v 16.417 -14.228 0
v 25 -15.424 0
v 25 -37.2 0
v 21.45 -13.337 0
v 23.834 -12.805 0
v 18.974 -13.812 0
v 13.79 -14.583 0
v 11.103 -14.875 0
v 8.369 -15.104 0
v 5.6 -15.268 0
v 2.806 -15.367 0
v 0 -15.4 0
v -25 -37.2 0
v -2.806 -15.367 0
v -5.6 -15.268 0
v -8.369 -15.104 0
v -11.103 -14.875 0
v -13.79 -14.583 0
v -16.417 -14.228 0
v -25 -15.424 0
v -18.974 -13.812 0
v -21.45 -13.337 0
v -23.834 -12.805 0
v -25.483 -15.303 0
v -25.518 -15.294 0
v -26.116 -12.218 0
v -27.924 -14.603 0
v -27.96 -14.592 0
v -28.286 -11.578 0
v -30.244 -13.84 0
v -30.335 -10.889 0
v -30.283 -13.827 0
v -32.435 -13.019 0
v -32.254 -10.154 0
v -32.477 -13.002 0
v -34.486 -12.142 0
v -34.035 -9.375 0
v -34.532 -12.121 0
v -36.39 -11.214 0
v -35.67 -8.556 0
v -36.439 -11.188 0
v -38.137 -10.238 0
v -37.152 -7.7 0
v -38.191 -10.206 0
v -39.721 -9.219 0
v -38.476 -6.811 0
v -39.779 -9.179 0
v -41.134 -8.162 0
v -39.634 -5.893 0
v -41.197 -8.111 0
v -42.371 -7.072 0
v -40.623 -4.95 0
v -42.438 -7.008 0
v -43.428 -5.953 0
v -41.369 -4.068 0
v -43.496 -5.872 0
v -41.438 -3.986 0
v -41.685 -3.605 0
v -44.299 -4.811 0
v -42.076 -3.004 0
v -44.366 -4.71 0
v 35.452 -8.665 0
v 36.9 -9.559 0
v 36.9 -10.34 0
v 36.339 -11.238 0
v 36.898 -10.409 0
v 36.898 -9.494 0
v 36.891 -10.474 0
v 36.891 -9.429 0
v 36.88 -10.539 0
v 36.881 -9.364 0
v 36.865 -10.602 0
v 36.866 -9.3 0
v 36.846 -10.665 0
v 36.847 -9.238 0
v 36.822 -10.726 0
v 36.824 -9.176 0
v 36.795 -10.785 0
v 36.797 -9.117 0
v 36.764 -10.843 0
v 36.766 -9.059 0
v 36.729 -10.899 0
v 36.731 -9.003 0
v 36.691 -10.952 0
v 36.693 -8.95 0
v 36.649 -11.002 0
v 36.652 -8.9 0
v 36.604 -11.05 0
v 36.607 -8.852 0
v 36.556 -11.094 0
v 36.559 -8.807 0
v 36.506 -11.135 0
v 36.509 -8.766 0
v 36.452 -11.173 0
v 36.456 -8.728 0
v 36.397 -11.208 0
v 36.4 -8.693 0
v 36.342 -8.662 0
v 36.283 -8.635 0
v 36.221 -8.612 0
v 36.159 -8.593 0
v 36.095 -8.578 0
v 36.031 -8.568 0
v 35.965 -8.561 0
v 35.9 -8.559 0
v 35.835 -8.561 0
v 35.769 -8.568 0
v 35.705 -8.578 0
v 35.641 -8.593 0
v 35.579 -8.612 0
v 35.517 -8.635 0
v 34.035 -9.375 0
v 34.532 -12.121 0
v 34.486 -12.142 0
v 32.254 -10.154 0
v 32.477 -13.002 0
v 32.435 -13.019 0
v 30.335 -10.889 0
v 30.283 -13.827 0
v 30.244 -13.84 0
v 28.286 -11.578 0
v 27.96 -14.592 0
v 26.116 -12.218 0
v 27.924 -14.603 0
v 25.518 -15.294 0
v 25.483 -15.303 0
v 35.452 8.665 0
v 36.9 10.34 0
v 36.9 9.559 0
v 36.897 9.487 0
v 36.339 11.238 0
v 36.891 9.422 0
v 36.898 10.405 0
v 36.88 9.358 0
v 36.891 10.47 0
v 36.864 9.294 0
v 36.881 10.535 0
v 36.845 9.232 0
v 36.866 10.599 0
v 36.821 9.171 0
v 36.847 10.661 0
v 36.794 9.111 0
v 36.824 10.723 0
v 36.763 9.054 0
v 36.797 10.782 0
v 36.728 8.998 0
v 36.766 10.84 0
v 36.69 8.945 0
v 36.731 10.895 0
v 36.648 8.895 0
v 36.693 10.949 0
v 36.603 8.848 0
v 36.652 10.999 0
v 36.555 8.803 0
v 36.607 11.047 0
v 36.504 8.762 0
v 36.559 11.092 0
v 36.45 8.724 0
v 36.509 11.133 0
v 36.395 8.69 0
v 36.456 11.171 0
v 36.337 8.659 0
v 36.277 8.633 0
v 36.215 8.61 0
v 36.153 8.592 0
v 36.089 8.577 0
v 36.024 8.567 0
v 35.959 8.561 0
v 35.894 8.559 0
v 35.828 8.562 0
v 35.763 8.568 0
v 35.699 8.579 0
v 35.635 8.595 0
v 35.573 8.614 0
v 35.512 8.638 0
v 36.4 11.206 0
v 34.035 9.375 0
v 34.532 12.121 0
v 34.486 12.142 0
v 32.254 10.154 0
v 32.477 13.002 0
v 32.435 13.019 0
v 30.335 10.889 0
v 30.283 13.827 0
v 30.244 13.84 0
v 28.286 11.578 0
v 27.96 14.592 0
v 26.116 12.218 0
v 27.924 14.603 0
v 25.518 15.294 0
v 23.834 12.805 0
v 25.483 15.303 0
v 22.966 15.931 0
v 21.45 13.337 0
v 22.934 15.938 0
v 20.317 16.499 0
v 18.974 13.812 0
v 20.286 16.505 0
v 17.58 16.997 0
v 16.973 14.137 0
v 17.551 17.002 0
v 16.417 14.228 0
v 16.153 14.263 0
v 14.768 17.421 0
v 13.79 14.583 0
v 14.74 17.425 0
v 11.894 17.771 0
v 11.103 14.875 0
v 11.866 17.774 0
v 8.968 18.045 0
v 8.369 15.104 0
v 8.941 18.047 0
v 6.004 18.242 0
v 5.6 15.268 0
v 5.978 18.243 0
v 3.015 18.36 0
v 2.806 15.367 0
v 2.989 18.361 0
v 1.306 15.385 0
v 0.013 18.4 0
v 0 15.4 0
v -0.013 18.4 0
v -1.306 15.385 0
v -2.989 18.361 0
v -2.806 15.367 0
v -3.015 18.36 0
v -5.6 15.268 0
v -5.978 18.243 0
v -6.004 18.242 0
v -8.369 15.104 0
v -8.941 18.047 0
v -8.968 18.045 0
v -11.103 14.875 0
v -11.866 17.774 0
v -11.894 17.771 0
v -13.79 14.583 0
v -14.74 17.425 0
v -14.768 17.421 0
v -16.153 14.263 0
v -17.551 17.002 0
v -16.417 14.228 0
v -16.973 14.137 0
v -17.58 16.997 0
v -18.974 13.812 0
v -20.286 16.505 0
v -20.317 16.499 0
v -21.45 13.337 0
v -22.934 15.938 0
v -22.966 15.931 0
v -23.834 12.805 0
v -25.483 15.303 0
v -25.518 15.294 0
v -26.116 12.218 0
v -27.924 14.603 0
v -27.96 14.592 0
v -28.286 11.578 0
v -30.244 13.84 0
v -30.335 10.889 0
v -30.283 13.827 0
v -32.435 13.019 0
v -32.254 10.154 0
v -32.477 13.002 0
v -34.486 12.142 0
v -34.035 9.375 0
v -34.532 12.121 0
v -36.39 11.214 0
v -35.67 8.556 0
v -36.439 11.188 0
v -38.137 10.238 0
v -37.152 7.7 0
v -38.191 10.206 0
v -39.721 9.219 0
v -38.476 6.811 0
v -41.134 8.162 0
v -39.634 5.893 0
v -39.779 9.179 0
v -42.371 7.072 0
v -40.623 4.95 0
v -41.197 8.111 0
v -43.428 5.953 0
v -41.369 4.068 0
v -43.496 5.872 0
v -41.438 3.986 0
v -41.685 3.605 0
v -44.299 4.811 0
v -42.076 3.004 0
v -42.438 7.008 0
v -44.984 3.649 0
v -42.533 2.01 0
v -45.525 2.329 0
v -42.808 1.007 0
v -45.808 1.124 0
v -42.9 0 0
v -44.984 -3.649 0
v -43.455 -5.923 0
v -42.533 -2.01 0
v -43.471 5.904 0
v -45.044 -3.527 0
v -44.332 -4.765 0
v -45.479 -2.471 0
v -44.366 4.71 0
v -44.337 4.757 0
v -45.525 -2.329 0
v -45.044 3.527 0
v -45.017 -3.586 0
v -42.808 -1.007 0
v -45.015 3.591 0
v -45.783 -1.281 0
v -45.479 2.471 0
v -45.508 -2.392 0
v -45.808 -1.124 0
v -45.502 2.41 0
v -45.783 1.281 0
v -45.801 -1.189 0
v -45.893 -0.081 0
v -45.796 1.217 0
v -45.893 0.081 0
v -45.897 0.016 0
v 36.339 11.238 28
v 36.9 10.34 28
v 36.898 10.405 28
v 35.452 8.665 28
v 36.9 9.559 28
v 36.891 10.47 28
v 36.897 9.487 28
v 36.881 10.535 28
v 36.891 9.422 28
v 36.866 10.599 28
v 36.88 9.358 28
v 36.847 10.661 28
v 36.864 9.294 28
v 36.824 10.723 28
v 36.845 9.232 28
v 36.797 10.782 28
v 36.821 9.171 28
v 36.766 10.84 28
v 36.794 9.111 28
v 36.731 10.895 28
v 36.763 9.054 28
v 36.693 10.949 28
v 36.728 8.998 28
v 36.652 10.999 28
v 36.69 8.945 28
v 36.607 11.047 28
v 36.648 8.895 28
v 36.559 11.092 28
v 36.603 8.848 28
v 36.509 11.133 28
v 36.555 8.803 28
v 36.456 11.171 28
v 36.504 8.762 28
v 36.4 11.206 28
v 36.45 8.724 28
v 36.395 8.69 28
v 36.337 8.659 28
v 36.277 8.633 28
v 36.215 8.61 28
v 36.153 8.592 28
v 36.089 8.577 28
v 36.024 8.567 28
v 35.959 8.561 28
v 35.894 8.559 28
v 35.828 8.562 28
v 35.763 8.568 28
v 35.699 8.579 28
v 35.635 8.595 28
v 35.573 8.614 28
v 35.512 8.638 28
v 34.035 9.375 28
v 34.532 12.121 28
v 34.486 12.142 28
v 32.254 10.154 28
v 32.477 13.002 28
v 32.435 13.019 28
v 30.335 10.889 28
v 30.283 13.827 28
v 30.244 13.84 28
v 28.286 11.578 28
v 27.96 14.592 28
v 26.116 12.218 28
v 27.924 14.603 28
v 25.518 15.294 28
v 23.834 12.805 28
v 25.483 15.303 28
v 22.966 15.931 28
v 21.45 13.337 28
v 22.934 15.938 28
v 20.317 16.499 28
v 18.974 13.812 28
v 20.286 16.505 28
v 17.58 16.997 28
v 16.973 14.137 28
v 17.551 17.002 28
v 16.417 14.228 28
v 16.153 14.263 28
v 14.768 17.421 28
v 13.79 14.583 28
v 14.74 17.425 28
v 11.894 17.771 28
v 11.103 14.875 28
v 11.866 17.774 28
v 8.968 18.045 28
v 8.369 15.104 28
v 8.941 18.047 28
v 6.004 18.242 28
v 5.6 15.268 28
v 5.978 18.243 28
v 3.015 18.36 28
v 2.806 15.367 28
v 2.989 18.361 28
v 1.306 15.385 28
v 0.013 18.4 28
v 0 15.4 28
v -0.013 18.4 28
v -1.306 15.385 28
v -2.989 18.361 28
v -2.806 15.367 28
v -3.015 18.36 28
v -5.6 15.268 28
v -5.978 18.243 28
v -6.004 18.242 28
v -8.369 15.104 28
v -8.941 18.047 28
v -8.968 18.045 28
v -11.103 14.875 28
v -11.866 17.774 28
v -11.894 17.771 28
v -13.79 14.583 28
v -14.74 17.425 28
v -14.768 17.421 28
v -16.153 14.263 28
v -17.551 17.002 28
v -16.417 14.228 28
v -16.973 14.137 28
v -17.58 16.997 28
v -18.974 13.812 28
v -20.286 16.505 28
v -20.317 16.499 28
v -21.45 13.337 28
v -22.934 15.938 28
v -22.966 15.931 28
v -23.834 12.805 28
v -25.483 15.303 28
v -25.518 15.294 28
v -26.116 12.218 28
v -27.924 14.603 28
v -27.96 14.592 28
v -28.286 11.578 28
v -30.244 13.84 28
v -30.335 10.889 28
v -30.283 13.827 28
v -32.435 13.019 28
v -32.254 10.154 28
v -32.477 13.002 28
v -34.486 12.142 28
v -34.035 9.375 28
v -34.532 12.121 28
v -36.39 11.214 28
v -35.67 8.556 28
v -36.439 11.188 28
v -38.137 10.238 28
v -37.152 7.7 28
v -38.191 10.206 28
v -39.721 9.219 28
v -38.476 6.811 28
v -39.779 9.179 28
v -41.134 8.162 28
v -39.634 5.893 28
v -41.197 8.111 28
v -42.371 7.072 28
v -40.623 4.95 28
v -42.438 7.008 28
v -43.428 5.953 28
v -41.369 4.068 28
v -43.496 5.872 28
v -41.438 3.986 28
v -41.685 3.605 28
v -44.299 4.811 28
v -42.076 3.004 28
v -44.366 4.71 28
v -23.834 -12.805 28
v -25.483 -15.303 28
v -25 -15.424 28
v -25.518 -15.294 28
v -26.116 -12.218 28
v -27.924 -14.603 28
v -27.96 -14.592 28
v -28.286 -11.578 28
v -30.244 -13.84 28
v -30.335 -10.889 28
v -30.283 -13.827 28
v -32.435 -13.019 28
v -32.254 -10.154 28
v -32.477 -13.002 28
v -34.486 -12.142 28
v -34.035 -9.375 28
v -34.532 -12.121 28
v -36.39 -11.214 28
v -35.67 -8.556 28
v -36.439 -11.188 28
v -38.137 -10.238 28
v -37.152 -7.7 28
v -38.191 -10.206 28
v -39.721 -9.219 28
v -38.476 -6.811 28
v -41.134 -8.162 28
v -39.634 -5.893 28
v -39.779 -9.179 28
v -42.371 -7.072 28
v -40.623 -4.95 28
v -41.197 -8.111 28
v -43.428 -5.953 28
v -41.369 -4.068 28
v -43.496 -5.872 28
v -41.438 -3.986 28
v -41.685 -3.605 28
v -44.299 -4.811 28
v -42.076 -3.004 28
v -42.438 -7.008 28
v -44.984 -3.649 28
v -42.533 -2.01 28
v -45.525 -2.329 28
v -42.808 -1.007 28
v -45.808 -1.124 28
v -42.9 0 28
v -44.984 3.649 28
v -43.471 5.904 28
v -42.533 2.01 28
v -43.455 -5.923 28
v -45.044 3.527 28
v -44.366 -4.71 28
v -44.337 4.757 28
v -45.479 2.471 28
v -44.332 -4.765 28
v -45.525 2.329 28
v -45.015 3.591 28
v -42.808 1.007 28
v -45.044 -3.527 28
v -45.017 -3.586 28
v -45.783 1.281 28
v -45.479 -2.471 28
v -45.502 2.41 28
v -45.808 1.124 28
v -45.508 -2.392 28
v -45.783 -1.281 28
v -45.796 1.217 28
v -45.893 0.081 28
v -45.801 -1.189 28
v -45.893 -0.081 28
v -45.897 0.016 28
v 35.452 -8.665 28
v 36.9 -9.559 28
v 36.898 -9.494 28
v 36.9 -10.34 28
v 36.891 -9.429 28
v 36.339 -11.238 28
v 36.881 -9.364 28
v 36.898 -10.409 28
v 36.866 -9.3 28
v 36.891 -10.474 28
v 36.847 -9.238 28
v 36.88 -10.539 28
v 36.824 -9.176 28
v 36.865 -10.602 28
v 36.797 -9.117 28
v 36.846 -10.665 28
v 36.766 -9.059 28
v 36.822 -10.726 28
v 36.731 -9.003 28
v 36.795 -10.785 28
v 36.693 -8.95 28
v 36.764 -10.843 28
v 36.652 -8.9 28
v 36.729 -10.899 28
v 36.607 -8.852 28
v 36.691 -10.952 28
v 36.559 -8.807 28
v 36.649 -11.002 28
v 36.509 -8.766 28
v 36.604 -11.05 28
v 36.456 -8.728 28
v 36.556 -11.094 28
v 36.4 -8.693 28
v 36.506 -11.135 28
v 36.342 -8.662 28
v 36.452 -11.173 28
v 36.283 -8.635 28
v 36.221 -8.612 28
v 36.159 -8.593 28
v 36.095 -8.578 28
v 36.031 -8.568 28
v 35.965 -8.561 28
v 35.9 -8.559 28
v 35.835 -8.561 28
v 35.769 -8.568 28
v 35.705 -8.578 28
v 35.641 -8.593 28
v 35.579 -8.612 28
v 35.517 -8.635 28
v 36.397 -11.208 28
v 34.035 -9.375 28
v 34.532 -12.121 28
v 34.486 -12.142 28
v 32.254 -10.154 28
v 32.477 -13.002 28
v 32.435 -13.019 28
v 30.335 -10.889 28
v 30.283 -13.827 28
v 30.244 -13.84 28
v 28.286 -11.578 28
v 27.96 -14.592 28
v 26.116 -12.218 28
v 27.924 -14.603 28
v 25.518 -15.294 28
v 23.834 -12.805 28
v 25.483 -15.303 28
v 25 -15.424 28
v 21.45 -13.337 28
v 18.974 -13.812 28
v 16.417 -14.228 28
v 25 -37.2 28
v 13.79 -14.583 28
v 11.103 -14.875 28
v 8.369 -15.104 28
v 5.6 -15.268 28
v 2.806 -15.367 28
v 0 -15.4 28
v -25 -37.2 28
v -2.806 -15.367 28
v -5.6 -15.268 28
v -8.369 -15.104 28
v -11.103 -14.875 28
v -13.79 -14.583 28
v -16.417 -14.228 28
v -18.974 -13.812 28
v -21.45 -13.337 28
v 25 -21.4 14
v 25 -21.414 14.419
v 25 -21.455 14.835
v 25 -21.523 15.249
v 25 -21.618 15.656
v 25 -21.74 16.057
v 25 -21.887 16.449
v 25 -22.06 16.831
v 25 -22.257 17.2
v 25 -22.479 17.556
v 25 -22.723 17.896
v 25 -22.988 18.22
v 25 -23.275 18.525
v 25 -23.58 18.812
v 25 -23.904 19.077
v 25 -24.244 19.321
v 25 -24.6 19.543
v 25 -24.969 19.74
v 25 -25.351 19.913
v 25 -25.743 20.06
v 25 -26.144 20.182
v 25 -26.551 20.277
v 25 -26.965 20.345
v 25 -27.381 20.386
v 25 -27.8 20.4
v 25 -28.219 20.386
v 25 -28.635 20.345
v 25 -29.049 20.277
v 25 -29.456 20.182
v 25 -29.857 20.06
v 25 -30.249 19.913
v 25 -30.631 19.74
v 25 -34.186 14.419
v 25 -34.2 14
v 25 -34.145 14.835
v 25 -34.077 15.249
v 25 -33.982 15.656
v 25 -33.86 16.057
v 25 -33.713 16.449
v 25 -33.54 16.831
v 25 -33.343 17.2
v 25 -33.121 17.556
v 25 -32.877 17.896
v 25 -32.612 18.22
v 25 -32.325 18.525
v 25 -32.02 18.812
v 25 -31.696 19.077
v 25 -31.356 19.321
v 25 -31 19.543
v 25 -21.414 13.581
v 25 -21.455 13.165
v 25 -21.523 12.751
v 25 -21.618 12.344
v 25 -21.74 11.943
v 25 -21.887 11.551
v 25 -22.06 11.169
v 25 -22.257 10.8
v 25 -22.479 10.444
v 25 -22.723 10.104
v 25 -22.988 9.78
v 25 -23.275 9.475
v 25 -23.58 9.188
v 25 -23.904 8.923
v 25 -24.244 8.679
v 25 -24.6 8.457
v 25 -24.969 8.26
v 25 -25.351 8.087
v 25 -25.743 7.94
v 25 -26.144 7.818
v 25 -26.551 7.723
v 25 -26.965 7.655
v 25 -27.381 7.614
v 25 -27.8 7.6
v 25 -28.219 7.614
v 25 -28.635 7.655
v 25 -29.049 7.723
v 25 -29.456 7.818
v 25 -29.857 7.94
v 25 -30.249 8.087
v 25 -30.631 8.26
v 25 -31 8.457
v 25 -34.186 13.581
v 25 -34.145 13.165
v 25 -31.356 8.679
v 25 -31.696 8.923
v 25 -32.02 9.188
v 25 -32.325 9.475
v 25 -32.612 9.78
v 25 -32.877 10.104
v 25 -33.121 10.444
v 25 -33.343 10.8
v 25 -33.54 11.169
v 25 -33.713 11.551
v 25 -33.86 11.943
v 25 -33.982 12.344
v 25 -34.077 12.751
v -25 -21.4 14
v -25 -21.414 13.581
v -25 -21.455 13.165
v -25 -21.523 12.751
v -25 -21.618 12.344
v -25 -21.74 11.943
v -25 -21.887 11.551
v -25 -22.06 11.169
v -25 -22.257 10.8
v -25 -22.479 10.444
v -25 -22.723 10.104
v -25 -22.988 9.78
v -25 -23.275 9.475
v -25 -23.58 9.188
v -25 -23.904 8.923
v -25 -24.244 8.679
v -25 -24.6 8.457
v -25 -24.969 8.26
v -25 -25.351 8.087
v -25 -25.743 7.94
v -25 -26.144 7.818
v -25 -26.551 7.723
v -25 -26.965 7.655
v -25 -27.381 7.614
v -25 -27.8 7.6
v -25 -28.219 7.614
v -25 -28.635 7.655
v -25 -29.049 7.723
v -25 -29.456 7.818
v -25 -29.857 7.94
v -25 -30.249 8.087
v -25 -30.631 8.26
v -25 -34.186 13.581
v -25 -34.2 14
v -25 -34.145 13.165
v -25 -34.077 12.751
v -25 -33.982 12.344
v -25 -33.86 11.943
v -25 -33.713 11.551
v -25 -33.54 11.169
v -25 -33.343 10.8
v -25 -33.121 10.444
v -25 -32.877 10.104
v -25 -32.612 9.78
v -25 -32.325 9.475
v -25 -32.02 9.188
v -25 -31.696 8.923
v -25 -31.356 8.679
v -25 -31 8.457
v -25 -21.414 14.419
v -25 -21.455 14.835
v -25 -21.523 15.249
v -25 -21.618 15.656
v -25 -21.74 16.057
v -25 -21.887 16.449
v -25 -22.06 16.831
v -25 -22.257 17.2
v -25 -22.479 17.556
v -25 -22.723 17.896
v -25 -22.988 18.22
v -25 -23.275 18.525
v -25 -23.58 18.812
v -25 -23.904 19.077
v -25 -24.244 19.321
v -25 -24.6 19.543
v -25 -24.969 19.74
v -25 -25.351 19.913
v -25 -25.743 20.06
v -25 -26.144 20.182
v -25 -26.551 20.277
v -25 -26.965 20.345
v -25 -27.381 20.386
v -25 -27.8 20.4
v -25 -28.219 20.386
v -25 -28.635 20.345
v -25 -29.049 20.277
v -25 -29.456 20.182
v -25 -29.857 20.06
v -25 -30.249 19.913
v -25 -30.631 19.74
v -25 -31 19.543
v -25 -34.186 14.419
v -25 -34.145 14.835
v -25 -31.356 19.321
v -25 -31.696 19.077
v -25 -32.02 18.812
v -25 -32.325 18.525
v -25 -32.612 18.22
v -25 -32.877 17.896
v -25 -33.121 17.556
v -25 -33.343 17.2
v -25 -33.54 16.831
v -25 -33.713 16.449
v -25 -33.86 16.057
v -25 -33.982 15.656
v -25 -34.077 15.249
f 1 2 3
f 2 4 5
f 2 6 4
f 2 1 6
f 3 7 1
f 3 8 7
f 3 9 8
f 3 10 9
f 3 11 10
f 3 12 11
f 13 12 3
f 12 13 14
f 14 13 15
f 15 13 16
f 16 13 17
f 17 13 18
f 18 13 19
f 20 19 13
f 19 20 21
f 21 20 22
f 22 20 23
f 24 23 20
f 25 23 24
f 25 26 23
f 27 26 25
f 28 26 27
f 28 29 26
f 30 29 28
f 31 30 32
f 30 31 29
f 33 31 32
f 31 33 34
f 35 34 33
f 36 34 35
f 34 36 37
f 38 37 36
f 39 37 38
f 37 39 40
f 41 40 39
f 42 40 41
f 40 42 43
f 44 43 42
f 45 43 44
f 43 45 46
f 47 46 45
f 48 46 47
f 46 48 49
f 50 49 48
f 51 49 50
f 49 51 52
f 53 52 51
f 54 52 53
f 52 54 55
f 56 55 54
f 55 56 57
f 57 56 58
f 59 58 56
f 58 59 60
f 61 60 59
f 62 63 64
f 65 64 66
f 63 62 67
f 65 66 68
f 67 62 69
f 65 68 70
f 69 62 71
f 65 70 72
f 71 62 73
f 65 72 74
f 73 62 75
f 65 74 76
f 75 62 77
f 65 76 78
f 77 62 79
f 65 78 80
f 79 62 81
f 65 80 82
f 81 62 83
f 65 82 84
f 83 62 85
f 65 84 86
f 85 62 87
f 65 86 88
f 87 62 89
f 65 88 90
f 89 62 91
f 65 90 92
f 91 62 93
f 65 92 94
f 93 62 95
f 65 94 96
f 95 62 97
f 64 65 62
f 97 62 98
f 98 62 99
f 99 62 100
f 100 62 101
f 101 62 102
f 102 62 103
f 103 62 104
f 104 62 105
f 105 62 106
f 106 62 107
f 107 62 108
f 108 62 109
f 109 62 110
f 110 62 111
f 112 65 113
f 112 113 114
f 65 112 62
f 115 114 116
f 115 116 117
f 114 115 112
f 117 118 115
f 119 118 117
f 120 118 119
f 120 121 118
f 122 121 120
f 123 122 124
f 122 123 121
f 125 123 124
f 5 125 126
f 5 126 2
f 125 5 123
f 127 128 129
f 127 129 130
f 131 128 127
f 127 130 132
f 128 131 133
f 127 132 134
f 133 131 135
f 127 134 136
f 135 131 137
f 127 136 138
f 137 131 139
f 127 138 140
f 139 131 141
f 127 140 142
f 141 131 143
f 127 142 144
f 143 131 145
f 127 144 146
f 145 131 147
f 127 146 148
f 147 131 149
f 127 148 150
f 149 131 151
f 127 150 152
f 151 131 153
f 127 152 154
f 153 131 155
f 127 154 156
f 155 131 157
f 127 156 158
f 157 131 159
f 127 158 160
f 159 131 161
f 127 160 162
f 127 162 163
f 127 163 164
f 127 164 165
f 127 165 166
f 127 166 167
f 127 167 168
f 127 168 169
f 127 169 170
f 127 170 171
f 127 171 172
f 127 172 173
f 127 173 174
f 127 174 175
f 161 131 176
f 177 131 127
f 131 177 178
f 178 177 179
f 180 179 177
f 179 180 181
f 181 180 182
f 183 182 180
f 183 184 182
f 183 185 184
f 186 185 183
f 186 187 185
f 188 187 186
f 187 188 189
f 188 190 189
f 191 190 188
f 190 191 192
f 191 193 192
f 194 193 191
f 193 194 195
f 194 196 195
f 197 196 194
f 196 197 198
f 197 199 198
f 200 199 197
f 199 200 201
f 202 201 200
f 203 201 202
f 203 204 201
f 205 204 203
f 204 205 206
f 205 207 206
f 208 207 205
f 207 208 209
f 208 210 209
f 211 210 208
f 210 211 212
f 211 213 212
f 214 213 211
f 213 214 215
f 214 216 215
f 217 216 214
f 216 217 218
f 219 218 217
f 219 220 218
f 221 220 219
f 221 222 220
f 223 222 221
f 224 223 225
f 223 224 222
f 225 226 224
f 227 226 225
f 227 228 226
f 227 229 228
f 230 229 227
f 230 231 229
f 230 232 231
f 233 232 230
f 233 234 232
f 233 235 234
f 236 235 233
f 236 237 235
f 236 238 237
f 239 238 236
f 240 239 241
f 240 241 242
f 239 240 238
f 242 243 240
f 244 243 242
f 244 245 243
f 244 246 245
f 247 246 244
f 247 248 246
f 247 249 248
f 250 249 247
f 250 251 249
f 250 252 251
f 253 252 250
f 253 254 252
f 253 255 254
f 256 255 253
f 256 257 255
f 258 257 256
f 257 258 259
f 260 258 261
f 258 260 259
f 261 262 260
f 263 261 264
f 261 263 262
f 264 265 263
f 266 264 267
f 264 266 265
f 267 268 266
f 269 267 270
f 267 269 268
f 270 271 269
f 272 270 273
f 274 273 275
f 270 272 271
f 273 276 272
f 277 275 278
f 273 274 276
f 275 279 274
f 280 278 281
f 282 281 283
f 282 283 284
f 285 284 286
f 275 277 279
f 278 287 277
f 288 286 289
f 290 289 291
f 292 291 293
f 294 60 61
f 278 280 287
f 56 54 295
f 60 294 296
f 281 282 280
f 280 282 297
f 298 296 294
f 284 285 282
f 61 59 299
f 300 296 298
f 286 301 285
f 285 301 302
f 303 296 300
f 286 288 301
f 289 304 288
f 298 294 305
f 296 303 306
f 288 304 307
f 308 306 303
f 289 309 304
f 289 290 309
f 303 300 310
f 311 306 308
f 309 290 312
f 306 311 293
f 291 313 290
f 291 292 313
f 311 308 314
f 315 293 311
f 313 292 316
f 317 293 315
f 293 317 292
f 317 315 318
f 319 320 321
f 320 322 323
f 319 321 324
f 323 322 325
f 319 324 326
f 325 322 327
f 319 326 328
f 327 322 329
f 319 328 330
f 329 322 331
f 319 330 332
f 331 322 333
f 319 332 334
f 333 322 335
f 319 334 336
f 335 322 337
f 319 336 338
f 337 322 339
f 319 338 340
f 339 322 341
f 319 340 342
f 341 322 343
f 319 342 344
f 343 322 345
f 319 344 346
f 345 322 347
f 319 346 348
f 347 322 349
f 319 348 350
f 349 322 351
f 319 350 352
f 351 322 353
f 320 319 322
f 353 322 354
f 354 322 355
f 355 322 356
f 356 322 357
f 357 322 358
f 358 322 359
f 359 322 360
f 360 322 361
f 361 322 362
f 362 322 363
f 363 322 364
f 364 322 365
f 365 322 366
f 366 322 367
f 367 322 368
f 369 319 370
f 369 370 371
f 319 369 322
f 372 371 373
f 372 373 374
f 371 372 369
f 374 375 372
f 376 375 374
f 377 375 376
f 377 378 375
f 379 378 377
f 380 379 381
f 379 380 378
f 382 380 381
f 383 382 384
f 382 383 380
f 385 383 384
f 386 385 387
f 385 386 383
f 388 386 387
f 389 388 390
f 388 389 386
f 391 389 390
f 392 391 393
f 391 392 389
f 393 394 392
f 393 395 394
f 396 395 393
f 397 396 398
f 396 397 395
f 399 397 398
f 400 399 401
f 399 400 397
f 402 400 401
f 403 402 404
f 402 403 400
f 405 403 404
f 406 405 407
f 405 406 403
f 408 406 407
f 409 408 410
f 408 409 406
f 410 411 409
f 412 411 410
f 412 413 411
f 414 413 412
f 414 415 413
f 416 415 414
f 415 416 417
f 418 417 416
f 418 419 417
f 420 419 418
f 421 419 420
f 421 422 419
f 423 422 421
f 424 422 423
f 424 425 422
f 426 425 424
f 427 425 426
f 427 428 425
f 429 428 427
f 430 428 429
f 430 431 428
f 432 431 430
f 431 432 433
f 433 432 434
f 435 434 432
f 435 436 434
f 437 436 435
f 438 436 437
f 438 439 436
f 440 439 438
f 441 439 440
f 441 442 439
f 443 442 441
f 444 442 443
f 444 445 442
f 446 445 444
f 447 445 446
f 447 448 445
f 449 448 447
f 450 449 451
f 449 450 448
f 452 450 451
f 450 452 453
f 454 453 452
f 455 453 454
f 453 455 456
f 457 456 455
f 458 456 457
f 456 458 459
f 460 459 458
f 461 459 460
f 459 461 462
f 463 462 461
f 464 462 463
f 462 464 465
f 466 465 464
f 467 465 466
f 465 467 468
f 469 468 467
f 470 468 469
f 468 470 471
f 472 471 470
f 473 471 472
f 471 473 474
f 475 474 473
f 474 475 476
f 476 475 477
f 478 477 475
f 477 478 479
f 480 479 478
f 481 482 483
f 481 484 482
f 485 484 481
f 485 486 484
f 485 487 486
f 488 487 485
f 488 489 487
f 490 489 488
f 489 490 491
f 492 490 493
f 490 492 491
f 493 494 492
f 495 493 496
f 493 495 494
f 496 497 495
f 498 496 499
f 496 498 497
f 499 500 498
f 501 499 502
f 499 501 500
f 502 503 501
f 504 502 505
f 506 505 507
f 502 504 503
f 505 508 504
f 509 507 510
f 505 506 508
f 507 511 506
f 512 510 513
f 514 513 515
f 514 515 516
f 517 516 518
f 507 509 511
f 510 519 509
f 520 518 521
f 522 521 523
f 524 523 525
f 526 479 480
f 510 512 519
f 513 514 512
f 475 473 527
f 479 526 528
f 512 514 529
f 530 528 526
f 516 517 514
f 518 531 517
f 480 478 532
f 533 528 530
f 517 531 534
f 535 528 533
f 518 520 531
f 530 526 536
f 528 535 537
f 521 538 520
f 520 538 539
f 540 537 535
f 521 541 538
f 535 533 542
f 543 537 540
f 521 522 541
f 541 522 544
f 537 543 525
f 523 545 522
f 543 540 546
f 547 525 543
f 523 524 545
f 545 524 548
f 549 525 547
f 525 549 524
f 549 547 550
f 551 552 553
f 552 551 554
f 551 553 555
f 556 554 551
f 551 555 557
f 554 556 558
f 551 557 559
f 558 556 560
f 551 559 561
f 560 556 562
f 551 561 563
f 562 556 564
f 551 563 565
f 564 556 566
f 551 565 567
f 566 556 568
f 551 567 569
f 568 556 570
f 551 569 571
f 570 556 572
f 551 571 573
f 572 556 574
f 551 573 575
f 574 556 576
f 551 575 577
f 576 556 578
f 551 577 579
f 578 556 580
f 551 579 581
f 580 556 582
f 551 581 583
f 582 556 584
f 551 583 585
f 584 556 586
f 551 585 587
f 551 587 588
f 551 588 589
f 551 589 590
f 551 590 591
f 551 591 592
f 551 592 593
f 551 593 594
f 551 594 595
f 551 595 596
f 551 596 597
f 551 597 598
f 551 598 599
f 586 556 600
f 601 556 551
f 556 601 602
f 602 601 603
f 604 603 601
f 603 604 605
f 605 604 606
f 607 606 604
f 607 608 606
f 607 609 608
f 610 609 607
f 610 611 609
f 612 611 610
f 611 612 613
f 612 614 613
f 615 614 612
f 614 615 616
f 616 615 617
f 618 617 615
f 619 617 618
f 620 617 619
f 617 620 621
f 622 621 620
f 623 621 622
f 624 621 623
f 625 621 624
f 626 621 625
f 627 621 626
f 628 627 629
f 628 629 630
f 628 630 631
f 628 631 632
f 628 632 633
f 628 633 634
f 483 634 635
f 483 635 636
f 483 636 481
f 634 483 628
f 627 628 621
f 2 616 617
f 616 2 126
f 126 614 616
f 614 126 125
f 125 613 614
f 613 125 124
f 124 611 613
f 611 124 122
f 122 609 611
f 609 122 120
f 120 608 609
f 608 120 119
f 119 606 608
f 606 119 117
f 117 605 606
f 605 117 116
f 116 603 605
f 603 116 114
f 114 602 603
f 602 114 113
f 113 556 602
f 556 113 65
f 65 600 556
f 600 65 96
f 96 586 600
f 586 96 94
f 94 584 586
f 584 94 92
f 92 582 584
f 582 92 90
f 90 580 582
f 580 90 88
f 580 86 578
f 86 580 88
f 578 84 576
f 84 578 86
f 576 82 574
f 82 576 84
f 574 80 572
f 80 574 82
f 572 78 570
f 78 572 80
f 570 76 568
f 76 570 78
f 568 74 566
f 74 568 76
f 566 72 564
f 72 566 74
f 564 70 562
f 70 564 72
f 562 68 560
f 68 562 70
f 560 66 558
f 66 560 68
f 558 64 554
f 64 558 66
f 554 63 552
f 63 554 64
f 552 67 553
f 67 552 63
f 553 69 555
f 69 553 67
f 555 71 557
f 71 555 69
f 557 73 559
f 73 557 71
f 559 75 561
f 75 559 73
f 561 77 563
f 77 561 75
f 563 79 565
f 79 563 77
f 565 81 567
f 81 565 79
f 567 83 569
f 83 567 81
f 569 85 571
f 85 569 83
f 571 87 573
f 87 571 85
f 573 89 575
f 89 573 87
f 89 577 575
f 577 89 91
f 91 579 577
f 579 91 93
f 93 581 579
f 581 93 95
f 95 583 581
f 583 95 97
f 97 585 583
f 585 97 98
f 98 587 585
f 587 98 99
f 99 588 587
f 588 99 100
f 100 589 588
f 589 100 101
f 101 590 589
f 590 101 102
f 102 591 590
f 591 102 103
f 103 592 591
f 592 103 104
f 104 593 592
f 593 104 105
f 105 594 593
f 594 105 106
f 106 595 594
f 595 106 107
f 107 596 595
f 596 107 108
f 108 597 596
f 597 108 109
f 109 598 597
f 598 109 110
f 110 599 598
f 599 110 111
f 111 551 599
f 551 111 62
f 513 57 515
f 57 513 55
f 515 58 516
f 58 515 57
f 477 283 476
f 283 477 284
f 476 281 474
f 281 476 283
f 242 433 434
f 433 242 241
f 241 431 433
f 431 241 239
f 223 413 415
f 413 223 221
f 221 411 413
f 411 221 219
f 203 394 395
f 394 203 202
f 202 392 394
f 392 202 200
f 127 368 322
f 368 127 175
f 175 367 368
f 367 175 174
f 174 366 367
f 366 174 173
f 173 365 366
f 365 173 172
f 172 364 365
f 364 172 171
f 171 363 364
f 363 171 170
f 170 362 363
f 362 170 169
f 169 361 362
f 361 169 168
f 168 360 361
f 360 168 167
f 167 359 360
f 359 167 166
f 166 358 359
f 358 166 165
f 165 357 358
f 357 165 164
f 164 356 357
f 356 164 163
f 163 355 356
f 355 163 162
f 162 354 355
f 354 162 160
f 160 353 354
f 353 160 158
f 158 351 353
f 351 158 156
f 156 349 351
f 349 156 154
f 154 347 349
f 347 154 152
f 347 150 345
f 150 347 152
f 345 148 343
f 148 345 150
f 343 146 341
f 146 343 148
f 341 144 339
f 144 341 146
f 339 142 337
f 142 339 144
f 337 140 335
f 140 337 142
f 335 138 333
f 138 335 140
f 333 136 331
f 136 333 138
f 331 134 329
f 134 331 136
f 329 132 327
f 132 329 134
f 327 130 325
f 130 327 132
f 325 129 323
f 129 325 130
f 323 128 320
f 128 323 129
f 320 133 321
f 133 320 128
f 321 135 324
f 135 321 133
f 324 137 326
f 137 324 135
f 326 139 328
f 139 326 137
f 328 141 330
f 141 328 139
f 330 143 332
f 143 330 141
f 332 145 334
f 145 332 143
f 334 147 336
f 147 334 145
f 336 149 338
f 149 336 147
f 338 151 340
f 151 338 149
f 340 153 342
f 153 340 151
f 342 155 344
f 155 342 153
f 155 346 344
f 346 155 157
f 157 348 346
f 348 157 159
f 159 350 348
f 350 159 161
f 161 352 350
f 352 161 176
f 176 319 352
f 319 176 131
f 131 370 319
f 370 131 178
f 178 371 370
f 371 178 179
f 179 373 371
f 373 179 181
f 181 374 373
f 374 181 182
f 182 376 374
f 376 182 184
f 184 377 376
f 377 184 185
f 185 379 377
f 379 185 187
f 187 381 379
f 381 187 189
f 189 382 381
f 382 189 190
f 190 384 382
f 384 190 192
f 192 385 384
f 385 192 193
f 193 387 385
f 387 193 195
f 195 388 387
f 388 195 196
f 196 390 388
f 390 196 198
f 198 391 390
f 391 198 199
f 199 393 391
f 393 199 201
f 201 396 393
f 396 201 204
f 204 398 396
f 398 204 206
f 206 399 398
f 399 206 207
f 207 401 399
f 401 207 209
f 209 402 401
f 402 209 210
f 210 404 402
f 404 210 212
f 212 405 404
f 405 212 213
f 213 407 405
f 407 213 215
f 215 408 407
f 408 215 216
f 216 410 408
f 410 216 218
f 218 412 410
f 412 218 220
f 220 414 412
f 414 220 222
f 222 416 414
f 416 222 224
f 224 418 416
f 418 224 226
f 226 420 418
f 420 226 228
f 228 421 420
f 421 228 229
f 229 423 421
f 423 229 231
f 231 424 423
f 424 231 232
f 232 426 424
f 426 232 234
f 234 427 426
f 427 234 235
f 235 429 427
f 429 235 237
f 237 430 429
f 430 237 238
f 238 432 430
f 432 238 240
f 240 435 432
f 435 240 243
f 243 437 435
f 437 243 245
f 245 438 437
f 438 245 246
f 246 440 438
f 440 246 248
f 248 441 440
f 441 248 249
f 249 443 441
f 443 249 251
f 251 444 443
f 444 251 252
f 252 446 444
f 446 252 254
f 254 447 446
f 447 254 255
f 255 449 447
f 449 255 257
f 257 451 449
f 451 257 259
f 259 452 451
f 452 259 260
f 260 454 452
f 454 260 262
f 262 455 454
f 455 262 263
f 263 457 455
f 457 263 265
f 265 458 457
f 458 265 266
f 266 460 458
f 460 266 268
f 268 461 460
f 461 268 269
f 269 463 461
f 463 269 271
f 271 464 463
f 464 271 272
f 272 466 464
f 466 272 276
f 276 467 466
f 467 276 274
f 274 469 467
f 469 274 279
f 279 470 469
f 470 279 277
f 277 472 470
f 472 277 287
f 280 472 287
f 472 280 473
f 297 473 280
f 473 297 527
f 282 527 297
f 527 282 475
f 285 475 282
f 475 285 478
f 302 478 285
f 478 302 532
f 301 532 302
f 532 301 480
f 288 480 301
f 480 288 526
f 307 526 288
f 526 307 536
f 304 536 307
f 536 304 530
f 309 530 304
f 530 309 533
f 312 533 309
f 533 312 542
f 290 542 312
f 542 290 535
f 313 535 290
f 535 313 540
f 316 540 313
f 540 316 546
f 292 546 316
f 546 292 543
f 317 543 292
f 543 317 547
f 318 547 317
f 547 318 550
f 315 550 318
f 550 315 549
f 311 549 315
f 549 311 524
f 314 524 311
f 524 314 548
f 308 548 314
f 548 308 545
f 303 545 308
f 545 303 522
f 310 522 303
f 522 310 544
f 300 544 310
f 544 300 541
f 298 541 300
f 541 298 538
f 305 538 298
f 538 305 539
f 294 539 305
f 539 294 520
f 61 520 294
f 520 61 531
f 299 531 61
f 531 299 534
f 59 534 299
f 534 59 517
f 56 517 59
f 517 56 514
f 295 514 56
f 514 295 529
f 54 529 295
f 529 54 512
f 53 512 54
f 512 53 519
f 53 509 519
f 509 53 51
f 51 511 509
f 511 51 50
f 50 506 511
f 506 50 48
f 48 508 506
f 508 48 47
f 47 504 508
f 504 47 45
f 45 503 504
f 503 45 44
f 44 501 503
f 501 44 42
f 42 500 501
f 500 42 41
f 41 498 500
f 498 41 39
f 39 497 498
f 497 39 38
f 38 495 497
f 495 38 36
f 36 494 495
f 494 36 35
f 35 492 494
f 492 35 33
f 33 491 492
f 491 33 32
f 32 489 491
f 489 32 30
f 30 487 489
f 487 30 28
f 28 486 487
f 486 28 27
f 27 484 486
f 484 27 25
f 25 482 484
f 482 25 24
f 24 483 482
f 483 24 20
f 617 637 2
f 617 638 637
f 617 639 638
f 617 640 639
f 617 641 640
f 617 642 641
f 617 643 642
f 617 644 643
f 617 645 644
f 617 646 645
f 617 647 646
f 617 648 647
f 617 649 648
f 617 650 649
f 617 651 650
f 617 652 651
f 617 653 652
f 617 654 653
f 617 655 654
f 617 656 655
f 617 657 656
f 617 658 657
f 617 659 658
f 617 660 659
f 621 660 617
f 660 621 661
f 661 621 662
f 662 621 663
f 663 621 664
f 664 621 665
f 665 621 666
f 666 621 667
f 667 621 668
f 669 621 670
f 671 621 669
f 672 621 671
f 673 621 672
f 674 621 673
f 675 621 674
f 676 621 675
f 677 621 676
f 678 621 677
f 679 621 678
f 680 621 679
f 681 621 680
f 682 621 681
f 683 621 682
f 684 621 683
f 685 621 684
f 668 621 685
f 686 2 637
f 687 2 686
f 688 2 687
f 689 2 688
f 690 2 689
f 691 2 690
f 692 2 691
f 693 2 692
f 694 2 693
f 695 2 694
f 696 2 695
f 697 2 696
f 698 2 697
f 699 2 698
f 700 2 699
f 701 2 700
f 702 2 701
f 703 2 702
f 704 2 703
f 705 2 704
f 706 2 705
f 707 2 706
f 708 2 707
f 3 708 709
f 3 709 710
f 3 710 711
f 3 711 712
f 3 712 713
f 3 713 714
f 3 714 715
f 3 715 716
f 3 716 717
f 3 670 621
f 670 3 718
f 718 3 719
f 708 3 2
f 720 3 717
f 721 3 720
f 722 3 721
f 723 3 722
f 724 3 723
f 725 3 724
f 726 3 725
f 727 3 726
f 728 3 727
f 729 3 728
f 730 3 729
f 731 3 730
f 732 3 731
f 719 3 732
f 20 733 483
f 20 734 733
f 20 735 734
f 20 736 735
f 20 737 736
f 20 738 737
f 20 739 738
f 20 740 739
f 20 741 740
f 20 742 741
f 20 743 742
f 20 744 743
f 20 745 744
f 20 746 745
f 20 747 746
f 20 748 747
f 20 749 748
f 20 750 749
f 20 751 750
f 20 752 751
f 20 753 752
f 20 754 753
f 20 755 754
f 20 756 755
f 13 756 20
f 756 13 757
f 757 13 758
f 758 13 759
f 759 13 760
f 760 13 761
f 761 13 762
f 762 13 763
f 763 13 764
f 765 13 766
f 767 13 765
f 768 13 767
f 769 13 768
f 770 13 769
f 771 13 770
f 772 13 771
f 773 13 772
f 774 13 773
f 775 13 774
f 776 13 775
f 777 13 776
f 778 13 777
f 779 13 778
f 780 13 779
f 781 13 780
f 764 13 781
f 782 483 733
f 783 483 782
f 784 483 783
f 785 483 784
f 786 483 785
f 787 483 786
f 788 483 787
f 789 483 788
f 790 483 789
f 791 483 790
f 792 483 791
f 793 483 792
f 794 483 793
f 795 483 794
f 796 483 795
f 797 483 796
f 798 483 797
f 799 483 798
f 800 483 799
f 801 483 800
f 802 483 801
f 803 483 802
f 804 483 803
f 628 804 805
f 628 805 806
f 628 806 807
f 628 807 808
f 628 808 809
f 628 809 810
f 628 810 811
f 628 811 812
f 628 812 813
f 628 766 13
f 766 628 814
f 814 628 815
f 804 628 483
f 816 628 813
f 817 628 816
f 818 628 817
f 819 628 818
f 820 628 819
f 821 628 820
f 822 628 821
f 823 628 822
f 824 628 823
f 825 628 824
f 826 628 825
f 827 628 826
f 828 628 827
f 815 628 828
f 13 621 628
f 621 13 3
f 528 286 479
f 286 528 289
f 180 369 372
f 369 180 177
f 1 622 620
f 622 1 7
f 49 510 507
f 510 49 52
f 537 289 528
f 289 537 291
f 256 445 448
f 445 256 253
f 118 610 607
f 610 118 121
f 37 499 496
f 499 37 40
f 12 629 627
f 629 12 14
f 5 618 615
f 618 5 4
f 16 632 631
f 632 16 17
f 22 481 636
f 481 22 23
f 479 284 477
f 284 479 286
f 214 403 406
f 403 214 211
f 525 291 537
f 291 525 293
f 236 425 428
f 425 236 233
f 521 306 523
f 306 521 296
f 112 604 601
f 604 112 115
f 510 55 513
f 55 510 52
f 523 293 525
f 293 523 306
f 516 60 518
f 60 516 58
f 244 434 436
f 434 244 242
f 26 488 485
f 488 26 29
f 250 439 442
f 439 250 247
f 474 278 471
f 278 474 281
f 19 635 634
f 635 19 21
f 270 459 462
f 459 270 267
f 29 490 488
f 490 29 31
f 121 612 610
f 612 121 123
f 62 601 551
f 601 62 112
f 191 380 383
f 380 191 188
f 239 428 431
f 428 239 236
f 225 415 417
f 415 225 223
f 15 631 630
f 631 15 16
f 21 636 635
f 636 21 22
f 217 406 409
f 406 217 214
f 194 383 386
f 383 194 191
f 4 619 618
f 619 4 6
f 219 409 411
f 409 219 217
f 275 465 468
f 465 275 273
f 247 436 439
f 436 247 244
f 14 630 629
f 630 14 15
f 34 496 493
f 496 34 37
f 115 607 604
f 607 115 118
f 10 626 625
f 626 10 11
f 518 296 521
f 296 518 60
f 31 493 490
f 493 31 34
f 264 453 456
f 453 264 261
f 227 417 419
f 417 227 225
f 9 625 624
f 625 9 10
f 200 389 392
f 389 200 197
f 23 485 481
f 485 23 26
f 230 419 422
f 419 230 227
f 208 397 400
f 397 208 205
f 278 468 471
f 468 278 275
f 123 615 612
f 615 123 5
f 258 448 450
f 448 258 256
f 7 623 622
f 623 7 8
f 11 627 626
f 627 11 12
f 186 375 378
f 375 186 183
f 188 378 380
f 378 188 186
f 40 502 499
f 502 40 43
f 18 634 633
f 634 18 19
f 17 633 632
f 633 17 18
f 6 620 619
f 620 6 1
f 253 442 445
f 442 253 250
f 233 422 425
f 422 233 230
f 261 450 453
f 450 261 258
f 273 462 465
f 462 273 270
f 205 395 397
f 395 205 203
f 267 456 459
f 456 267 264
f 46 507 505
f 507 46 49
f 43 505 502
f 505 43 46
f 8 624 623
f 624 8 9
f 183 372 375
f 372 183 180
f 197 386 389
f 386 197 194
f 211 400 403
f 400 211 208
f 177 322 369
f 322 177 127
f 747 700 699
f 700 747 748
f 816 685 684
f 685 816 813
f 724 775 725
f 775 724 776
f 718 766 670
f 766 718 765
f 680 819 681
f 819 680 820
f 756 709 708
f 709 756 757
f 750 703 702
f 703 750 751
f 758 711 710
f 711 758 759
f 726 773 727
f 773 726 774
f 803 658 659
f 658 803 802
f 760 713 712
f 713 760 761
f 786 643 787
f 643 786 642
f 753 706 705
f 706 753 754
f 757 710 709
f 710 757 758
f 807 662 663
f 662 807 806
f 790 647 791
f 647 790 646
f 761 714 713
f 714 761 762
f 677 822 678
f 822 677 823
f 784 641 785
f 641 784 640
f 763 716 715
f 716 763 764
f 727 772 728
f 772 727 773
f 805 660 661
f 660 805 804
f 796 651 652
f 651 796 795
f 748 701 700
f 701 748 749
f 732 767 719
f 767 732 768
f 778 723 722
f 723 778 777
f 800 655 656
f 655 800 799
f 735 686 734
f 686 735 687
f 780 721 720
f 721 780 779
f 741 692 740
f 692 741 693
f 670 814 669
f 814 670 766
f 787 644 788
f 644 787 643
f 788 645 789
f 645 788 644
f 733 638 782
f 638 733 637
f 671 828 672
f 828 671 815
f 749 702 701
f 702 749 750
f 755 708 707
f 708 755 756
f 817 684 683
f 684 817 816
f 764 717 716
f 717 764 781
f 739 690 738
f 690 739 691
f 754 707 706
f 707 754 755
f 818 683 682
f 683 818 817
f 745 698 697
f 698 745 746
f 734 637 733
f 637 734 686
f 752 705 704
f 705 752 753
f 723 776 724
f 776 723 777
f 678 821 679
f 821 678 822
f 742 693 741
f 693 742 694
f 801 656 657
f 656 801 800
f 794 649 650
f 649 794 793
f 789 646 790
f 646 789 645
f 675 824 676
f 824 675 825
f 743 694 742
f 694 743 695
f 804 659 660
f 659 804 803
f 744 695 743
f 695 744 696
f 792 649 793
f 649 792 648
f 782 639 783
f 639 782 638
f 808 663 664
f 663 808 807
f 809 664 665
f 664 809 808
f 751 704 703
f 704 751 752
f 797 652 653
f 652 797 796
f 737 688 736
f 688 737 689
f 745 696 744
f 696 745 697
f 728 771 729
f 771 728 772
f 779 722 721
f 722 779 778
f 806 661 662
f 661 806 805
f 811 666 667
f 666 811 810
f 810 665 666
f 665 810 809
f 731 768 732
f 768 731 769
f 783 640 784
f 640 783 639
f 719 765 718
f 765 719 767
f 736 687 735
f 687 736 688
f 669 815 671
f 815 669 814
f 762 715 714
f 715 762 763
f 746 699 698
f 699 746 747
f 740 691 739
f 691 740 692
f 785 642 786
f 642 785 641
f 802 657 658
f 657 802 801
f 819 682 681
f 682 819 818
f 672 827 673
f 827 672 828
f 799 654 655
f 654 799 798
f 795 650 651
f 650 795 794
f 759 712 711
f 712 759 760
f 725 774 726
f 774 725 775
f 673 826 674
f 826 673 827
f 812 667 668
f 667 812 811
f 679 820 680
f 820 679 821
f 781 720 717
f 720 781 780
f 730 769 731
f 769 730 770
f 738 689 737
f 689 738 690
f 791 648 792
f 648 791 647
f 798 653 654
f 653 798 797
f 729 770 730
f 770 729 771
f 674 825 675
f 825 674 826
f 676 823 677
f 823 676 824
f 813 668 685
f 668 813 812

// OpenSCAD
// Universal cuff (Universalmanschette) - parametric, all dimensions in mm.
// C-shaped band around the palm with a pocket that holds a spoon, fork, pen or
// toothbrush - for people who cannot close their hand (e.g. tetraplegia C5/C6,
// severe arthritis, stroke). Print flat (band width = Z), PETG or TPU recommended.

palm_width      = 85;   // palm width across the knuckles (MCP joints)
hand_thickness  = 30;   // hand thickness palm-to-back at the knuckles
band_width      = 28;   // width of the band along the hand
wall            = 3;    // band wall thickness
opening         = 24;   // gap on the thumb side to slip the hand in
holder_diameter = 12;   // diameter of the utensil handle that goes into the pocket
holder_length   = 50;   // length of the utensil pocket
holder_wall     = 3;    // wall around the pocket
holder_offset   = 0;    // shift pocket along the palm width (+ = towards thumb side)
tolerance       = 0.4;

$fn = 96;

a  = palm_width / 2 + tolerance;
b  = hand_thickness / 2 + tolerance;
hd = holder_diameter + 2 * tolerance;
ho = hd + 2 * holder_wall;
H  = max(band_width, ho);

module ellipse(rx, ry) scale([rx, ry]) circle(r = 1);

module band2d()
    offset(r = 1) offset(delta = -1)
    difference() {
        ellipse(a + wall, b + wall);
        ellipse(a, b);
        translate([a - 2 * wall, -opening / 2]) square([5 * wall, opening]);
    }

y_face = -(b + wall);               // outermost palm-side point of the band

difference() {
    union() {
        linear_extrude(height = H) band2d();
        // pocket block on the palm side
        translate([holder_offset - holder_length / 2, y_face - ho, 0])
            cube([holder_length, ho - y_face, H]);
    }
    // keep the hand cavity clean
    translate([0, 0, -1]) linear_extrude(height = H + 2) ellipse(a, b);
    // utensil pocket (horizontal, along the palm width)
    translate([holder_offset - holder_length / 2 - 1, y_face - ho / 2, H / 2])
        rotate([0, 90, 0]) cylinder(d = hd, h = holder_length + 2);
}
